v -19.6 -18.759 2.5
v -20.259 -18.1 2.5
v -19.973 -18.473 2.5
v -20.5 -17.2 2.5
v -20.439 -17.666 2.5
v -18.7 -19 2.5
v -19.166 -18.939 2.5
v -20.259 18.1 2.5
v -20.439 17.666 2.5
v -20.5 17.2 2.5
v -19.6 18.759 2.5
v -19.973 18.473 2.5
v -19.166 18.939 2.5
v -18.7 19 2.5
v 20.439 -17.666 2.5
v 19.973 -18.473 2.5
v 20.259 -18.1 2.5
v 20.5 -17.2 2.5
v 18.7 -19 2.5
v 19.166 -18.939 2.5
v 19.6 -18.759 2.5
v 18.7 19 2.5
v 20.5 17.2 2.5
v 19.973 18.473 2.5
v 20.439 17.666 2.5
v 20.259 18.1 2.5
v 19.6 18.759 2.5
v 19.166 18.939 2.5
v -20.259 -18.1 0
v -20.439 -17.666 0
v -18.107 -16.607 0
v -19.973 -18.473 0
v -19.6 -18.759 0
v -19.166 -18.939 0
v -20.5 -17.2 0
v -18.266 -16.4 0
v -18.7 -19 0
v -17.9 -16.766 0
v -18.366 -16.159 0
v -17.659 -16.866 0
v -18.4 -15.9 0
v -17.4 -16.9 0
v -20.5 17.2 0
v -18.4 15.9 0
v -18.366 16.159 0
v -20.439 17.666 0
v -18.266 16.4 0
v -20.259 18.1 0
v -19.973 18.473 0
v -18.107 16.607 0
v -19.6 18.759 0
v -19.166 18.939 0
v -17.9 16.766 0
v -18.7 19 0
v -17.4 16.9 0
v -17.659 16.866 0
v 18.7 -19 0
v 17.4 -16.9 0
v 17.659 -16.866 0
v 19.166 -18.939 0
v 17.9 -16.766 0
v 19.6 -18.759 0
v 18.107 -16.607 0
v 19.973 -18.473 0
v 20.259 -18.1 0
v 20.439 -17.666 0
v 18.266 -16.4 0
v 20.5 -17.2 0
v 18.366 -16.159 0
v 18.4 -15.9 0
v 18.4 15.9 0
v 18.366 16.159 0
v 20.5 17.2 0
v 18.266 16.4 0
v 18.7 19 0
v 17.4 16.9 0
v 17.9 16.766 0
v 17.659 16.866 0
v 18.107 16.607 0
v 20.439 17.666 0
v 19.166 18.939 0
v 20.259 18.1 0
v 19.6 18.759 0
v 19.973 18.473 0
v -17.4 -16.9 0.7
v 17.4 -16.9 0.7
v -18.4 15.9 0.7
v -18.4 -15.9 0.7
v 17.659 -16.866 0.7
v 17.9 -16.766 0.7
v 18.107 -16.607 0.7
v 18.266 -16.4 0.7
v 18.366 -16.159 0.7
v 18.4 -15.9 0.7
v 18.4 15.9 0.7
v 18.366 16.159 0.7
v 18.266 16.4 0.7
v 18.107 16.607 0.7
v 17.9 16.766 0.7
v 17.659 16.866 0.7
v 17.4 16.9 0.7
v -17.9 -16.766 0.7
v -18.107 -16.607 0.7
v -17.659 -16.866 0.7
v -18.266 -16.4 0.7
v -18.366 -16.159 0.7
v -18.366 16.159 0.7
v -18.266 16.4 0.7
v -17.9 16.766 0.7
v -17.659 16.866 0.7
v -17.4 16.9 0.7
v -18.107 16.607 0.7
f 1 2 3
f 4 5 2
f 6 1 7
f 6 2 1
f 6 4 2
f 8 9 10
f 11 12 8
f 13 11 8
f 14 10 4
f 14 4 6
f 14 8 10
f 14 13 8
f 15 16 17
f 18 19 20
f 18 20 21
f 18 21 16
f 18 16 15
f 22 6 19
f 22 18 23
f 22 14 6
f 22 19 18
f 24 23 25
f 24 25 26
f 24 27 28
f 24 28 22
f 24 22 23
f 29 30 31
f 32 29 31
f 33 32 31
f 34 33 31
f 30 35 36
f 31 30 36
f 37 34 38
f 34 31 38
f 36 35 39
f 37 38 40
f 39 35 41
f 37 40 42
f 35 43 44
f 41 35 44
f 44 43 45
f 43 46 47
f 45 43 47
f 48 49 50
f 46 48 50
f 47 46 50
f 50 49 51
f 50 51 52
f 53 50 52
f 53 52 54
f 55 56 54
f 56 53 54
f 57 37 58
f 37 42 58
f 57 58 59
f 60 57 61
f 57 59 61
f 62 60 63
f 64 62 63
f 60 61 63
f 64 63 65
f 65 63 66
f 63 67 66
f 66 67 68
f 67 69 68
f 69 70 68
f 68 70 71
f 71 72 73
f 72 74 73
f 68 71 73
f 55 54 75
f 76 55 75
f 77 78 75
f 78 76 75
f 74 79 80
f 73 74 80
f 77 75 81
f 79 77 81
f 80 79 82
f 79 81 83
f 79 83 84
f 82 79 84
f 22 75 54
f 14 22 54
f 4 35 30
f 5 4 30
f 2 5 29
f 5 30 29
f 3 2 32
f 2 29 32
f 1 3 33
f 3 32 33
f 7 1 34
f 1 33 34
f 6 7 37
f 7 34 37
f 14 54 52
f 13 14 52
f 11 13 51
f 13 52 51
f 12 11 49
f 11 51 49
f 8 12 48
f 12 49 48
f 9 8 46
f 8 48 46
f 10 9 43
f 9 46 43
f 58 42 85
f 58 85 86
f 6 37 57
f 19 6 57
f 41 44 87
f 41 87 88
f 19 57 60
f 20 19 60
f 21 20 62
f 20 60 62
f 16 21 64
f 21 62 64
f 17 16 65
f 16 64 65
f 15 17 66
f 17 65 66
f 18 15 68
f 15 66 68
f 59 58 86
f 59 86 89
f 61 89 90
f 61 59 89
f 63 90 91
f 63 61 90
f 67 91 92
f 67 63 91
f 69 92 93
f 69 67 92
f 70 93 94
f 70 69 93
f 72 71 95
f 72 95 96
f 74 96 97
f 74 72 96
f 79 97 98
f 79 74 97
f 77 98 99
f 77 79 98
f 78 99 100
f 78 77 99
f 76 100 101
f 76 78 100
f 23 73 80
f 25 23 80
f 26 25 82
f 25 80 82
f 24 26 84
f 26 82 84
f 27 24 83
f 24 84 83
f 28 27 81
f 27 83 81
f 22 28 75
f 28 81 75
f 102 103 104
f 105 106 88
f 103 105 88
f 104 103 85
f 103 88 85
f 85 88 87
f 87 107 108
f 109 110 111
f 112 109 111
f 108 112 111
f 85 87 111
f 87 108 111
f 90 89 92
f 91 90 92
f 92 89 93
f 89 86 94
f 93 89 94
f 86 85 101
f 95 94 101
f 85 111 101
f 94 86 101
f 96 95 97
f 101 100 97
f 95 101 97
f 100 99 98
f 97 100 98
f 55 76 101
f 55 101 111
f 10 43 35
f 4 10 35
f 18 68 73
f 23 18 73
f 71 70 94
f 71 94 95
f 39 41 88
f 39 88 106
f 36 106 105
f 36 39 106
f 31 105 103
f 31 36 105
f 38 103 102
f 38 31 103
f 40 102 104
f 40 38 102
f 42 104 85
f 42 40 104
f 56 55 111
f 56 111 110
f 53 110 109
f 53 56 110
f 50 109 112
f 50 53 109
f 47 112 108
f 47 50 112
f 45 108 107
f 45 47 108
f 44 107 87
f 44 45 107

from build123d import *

# Parameters (mm, degrees)
FACTORY_SNAP_LID_DEPTH             = 2.5
MOULDED_LID_UNDERSIDE_RELIEF_DEPTH = 0.7


with BuildPart() as part:
    # Factory_snap_lid_Sketch → Factory_snap_lid (new body)
    with BuildSketch(Plane.XY):
        with BuildLine():
            Line((-18.7, -19), (18.7, -19))
            ThreePointArc((18.7, -19), (19.972792206, -18.472792206), (20.5, -17.2))
            Line((20.5, -17.2), (20.5, 17.2))
            ThreePointArc((20.5, 17.2), (19.972792206, 18.472792206), (18.7, 19))
            Line((18.7, 19), (-18.7, 19))
            ThreePointArc((-18.7, 19), (-19.972792206, 18.472792206), (-20.5, 17.2))
            Line((-20.5, 17.2), (-20.5, -17.2))
            ThreePointArc((-20.5, -17.2), (-19.972792206, -18.472792206), (-18.7, -19))
        make_face()
    extrude(amount=FACTORY_SNAP_LID_DEPTH)

    # Moulded_lid_underside_relief_Sketch → Moulded_lid_underside_relief (cut)
    with BuildSketch(Plane.XY):
        with BuildLine():
            Line((-17.4, -16.9), (17.4, -16.9))
            ThreePointArc((17.4, -16.9), (18.107106781, -16.607106781), (18.4, -15.9))
            Line((18.4, -15.9), (18.4, 15.9))
            ThreePointArc((18.4, 15.9), (18.107106781, 16.607106781), (17.4, 16.9))
            Line((17.4, 16.9), (-17.4, 16.9))
            ThreePointArc((-17.4, 16.9), (-18.107106781, 16.607106781), (-18.4, 15.9))
            Line((-18.4, 15.9), (-18.4, -15.9))
            ThreePointArc((-18.4, -15.9), (-18.107106781, -16.607106781), (-17.4, -16.9))
        make_face()
    extrude(amount=MOULDED_LID_UNDERSIDE_RELIEF_DEPTH, mode=Mode.SUBTRACT)


solid = part.part
